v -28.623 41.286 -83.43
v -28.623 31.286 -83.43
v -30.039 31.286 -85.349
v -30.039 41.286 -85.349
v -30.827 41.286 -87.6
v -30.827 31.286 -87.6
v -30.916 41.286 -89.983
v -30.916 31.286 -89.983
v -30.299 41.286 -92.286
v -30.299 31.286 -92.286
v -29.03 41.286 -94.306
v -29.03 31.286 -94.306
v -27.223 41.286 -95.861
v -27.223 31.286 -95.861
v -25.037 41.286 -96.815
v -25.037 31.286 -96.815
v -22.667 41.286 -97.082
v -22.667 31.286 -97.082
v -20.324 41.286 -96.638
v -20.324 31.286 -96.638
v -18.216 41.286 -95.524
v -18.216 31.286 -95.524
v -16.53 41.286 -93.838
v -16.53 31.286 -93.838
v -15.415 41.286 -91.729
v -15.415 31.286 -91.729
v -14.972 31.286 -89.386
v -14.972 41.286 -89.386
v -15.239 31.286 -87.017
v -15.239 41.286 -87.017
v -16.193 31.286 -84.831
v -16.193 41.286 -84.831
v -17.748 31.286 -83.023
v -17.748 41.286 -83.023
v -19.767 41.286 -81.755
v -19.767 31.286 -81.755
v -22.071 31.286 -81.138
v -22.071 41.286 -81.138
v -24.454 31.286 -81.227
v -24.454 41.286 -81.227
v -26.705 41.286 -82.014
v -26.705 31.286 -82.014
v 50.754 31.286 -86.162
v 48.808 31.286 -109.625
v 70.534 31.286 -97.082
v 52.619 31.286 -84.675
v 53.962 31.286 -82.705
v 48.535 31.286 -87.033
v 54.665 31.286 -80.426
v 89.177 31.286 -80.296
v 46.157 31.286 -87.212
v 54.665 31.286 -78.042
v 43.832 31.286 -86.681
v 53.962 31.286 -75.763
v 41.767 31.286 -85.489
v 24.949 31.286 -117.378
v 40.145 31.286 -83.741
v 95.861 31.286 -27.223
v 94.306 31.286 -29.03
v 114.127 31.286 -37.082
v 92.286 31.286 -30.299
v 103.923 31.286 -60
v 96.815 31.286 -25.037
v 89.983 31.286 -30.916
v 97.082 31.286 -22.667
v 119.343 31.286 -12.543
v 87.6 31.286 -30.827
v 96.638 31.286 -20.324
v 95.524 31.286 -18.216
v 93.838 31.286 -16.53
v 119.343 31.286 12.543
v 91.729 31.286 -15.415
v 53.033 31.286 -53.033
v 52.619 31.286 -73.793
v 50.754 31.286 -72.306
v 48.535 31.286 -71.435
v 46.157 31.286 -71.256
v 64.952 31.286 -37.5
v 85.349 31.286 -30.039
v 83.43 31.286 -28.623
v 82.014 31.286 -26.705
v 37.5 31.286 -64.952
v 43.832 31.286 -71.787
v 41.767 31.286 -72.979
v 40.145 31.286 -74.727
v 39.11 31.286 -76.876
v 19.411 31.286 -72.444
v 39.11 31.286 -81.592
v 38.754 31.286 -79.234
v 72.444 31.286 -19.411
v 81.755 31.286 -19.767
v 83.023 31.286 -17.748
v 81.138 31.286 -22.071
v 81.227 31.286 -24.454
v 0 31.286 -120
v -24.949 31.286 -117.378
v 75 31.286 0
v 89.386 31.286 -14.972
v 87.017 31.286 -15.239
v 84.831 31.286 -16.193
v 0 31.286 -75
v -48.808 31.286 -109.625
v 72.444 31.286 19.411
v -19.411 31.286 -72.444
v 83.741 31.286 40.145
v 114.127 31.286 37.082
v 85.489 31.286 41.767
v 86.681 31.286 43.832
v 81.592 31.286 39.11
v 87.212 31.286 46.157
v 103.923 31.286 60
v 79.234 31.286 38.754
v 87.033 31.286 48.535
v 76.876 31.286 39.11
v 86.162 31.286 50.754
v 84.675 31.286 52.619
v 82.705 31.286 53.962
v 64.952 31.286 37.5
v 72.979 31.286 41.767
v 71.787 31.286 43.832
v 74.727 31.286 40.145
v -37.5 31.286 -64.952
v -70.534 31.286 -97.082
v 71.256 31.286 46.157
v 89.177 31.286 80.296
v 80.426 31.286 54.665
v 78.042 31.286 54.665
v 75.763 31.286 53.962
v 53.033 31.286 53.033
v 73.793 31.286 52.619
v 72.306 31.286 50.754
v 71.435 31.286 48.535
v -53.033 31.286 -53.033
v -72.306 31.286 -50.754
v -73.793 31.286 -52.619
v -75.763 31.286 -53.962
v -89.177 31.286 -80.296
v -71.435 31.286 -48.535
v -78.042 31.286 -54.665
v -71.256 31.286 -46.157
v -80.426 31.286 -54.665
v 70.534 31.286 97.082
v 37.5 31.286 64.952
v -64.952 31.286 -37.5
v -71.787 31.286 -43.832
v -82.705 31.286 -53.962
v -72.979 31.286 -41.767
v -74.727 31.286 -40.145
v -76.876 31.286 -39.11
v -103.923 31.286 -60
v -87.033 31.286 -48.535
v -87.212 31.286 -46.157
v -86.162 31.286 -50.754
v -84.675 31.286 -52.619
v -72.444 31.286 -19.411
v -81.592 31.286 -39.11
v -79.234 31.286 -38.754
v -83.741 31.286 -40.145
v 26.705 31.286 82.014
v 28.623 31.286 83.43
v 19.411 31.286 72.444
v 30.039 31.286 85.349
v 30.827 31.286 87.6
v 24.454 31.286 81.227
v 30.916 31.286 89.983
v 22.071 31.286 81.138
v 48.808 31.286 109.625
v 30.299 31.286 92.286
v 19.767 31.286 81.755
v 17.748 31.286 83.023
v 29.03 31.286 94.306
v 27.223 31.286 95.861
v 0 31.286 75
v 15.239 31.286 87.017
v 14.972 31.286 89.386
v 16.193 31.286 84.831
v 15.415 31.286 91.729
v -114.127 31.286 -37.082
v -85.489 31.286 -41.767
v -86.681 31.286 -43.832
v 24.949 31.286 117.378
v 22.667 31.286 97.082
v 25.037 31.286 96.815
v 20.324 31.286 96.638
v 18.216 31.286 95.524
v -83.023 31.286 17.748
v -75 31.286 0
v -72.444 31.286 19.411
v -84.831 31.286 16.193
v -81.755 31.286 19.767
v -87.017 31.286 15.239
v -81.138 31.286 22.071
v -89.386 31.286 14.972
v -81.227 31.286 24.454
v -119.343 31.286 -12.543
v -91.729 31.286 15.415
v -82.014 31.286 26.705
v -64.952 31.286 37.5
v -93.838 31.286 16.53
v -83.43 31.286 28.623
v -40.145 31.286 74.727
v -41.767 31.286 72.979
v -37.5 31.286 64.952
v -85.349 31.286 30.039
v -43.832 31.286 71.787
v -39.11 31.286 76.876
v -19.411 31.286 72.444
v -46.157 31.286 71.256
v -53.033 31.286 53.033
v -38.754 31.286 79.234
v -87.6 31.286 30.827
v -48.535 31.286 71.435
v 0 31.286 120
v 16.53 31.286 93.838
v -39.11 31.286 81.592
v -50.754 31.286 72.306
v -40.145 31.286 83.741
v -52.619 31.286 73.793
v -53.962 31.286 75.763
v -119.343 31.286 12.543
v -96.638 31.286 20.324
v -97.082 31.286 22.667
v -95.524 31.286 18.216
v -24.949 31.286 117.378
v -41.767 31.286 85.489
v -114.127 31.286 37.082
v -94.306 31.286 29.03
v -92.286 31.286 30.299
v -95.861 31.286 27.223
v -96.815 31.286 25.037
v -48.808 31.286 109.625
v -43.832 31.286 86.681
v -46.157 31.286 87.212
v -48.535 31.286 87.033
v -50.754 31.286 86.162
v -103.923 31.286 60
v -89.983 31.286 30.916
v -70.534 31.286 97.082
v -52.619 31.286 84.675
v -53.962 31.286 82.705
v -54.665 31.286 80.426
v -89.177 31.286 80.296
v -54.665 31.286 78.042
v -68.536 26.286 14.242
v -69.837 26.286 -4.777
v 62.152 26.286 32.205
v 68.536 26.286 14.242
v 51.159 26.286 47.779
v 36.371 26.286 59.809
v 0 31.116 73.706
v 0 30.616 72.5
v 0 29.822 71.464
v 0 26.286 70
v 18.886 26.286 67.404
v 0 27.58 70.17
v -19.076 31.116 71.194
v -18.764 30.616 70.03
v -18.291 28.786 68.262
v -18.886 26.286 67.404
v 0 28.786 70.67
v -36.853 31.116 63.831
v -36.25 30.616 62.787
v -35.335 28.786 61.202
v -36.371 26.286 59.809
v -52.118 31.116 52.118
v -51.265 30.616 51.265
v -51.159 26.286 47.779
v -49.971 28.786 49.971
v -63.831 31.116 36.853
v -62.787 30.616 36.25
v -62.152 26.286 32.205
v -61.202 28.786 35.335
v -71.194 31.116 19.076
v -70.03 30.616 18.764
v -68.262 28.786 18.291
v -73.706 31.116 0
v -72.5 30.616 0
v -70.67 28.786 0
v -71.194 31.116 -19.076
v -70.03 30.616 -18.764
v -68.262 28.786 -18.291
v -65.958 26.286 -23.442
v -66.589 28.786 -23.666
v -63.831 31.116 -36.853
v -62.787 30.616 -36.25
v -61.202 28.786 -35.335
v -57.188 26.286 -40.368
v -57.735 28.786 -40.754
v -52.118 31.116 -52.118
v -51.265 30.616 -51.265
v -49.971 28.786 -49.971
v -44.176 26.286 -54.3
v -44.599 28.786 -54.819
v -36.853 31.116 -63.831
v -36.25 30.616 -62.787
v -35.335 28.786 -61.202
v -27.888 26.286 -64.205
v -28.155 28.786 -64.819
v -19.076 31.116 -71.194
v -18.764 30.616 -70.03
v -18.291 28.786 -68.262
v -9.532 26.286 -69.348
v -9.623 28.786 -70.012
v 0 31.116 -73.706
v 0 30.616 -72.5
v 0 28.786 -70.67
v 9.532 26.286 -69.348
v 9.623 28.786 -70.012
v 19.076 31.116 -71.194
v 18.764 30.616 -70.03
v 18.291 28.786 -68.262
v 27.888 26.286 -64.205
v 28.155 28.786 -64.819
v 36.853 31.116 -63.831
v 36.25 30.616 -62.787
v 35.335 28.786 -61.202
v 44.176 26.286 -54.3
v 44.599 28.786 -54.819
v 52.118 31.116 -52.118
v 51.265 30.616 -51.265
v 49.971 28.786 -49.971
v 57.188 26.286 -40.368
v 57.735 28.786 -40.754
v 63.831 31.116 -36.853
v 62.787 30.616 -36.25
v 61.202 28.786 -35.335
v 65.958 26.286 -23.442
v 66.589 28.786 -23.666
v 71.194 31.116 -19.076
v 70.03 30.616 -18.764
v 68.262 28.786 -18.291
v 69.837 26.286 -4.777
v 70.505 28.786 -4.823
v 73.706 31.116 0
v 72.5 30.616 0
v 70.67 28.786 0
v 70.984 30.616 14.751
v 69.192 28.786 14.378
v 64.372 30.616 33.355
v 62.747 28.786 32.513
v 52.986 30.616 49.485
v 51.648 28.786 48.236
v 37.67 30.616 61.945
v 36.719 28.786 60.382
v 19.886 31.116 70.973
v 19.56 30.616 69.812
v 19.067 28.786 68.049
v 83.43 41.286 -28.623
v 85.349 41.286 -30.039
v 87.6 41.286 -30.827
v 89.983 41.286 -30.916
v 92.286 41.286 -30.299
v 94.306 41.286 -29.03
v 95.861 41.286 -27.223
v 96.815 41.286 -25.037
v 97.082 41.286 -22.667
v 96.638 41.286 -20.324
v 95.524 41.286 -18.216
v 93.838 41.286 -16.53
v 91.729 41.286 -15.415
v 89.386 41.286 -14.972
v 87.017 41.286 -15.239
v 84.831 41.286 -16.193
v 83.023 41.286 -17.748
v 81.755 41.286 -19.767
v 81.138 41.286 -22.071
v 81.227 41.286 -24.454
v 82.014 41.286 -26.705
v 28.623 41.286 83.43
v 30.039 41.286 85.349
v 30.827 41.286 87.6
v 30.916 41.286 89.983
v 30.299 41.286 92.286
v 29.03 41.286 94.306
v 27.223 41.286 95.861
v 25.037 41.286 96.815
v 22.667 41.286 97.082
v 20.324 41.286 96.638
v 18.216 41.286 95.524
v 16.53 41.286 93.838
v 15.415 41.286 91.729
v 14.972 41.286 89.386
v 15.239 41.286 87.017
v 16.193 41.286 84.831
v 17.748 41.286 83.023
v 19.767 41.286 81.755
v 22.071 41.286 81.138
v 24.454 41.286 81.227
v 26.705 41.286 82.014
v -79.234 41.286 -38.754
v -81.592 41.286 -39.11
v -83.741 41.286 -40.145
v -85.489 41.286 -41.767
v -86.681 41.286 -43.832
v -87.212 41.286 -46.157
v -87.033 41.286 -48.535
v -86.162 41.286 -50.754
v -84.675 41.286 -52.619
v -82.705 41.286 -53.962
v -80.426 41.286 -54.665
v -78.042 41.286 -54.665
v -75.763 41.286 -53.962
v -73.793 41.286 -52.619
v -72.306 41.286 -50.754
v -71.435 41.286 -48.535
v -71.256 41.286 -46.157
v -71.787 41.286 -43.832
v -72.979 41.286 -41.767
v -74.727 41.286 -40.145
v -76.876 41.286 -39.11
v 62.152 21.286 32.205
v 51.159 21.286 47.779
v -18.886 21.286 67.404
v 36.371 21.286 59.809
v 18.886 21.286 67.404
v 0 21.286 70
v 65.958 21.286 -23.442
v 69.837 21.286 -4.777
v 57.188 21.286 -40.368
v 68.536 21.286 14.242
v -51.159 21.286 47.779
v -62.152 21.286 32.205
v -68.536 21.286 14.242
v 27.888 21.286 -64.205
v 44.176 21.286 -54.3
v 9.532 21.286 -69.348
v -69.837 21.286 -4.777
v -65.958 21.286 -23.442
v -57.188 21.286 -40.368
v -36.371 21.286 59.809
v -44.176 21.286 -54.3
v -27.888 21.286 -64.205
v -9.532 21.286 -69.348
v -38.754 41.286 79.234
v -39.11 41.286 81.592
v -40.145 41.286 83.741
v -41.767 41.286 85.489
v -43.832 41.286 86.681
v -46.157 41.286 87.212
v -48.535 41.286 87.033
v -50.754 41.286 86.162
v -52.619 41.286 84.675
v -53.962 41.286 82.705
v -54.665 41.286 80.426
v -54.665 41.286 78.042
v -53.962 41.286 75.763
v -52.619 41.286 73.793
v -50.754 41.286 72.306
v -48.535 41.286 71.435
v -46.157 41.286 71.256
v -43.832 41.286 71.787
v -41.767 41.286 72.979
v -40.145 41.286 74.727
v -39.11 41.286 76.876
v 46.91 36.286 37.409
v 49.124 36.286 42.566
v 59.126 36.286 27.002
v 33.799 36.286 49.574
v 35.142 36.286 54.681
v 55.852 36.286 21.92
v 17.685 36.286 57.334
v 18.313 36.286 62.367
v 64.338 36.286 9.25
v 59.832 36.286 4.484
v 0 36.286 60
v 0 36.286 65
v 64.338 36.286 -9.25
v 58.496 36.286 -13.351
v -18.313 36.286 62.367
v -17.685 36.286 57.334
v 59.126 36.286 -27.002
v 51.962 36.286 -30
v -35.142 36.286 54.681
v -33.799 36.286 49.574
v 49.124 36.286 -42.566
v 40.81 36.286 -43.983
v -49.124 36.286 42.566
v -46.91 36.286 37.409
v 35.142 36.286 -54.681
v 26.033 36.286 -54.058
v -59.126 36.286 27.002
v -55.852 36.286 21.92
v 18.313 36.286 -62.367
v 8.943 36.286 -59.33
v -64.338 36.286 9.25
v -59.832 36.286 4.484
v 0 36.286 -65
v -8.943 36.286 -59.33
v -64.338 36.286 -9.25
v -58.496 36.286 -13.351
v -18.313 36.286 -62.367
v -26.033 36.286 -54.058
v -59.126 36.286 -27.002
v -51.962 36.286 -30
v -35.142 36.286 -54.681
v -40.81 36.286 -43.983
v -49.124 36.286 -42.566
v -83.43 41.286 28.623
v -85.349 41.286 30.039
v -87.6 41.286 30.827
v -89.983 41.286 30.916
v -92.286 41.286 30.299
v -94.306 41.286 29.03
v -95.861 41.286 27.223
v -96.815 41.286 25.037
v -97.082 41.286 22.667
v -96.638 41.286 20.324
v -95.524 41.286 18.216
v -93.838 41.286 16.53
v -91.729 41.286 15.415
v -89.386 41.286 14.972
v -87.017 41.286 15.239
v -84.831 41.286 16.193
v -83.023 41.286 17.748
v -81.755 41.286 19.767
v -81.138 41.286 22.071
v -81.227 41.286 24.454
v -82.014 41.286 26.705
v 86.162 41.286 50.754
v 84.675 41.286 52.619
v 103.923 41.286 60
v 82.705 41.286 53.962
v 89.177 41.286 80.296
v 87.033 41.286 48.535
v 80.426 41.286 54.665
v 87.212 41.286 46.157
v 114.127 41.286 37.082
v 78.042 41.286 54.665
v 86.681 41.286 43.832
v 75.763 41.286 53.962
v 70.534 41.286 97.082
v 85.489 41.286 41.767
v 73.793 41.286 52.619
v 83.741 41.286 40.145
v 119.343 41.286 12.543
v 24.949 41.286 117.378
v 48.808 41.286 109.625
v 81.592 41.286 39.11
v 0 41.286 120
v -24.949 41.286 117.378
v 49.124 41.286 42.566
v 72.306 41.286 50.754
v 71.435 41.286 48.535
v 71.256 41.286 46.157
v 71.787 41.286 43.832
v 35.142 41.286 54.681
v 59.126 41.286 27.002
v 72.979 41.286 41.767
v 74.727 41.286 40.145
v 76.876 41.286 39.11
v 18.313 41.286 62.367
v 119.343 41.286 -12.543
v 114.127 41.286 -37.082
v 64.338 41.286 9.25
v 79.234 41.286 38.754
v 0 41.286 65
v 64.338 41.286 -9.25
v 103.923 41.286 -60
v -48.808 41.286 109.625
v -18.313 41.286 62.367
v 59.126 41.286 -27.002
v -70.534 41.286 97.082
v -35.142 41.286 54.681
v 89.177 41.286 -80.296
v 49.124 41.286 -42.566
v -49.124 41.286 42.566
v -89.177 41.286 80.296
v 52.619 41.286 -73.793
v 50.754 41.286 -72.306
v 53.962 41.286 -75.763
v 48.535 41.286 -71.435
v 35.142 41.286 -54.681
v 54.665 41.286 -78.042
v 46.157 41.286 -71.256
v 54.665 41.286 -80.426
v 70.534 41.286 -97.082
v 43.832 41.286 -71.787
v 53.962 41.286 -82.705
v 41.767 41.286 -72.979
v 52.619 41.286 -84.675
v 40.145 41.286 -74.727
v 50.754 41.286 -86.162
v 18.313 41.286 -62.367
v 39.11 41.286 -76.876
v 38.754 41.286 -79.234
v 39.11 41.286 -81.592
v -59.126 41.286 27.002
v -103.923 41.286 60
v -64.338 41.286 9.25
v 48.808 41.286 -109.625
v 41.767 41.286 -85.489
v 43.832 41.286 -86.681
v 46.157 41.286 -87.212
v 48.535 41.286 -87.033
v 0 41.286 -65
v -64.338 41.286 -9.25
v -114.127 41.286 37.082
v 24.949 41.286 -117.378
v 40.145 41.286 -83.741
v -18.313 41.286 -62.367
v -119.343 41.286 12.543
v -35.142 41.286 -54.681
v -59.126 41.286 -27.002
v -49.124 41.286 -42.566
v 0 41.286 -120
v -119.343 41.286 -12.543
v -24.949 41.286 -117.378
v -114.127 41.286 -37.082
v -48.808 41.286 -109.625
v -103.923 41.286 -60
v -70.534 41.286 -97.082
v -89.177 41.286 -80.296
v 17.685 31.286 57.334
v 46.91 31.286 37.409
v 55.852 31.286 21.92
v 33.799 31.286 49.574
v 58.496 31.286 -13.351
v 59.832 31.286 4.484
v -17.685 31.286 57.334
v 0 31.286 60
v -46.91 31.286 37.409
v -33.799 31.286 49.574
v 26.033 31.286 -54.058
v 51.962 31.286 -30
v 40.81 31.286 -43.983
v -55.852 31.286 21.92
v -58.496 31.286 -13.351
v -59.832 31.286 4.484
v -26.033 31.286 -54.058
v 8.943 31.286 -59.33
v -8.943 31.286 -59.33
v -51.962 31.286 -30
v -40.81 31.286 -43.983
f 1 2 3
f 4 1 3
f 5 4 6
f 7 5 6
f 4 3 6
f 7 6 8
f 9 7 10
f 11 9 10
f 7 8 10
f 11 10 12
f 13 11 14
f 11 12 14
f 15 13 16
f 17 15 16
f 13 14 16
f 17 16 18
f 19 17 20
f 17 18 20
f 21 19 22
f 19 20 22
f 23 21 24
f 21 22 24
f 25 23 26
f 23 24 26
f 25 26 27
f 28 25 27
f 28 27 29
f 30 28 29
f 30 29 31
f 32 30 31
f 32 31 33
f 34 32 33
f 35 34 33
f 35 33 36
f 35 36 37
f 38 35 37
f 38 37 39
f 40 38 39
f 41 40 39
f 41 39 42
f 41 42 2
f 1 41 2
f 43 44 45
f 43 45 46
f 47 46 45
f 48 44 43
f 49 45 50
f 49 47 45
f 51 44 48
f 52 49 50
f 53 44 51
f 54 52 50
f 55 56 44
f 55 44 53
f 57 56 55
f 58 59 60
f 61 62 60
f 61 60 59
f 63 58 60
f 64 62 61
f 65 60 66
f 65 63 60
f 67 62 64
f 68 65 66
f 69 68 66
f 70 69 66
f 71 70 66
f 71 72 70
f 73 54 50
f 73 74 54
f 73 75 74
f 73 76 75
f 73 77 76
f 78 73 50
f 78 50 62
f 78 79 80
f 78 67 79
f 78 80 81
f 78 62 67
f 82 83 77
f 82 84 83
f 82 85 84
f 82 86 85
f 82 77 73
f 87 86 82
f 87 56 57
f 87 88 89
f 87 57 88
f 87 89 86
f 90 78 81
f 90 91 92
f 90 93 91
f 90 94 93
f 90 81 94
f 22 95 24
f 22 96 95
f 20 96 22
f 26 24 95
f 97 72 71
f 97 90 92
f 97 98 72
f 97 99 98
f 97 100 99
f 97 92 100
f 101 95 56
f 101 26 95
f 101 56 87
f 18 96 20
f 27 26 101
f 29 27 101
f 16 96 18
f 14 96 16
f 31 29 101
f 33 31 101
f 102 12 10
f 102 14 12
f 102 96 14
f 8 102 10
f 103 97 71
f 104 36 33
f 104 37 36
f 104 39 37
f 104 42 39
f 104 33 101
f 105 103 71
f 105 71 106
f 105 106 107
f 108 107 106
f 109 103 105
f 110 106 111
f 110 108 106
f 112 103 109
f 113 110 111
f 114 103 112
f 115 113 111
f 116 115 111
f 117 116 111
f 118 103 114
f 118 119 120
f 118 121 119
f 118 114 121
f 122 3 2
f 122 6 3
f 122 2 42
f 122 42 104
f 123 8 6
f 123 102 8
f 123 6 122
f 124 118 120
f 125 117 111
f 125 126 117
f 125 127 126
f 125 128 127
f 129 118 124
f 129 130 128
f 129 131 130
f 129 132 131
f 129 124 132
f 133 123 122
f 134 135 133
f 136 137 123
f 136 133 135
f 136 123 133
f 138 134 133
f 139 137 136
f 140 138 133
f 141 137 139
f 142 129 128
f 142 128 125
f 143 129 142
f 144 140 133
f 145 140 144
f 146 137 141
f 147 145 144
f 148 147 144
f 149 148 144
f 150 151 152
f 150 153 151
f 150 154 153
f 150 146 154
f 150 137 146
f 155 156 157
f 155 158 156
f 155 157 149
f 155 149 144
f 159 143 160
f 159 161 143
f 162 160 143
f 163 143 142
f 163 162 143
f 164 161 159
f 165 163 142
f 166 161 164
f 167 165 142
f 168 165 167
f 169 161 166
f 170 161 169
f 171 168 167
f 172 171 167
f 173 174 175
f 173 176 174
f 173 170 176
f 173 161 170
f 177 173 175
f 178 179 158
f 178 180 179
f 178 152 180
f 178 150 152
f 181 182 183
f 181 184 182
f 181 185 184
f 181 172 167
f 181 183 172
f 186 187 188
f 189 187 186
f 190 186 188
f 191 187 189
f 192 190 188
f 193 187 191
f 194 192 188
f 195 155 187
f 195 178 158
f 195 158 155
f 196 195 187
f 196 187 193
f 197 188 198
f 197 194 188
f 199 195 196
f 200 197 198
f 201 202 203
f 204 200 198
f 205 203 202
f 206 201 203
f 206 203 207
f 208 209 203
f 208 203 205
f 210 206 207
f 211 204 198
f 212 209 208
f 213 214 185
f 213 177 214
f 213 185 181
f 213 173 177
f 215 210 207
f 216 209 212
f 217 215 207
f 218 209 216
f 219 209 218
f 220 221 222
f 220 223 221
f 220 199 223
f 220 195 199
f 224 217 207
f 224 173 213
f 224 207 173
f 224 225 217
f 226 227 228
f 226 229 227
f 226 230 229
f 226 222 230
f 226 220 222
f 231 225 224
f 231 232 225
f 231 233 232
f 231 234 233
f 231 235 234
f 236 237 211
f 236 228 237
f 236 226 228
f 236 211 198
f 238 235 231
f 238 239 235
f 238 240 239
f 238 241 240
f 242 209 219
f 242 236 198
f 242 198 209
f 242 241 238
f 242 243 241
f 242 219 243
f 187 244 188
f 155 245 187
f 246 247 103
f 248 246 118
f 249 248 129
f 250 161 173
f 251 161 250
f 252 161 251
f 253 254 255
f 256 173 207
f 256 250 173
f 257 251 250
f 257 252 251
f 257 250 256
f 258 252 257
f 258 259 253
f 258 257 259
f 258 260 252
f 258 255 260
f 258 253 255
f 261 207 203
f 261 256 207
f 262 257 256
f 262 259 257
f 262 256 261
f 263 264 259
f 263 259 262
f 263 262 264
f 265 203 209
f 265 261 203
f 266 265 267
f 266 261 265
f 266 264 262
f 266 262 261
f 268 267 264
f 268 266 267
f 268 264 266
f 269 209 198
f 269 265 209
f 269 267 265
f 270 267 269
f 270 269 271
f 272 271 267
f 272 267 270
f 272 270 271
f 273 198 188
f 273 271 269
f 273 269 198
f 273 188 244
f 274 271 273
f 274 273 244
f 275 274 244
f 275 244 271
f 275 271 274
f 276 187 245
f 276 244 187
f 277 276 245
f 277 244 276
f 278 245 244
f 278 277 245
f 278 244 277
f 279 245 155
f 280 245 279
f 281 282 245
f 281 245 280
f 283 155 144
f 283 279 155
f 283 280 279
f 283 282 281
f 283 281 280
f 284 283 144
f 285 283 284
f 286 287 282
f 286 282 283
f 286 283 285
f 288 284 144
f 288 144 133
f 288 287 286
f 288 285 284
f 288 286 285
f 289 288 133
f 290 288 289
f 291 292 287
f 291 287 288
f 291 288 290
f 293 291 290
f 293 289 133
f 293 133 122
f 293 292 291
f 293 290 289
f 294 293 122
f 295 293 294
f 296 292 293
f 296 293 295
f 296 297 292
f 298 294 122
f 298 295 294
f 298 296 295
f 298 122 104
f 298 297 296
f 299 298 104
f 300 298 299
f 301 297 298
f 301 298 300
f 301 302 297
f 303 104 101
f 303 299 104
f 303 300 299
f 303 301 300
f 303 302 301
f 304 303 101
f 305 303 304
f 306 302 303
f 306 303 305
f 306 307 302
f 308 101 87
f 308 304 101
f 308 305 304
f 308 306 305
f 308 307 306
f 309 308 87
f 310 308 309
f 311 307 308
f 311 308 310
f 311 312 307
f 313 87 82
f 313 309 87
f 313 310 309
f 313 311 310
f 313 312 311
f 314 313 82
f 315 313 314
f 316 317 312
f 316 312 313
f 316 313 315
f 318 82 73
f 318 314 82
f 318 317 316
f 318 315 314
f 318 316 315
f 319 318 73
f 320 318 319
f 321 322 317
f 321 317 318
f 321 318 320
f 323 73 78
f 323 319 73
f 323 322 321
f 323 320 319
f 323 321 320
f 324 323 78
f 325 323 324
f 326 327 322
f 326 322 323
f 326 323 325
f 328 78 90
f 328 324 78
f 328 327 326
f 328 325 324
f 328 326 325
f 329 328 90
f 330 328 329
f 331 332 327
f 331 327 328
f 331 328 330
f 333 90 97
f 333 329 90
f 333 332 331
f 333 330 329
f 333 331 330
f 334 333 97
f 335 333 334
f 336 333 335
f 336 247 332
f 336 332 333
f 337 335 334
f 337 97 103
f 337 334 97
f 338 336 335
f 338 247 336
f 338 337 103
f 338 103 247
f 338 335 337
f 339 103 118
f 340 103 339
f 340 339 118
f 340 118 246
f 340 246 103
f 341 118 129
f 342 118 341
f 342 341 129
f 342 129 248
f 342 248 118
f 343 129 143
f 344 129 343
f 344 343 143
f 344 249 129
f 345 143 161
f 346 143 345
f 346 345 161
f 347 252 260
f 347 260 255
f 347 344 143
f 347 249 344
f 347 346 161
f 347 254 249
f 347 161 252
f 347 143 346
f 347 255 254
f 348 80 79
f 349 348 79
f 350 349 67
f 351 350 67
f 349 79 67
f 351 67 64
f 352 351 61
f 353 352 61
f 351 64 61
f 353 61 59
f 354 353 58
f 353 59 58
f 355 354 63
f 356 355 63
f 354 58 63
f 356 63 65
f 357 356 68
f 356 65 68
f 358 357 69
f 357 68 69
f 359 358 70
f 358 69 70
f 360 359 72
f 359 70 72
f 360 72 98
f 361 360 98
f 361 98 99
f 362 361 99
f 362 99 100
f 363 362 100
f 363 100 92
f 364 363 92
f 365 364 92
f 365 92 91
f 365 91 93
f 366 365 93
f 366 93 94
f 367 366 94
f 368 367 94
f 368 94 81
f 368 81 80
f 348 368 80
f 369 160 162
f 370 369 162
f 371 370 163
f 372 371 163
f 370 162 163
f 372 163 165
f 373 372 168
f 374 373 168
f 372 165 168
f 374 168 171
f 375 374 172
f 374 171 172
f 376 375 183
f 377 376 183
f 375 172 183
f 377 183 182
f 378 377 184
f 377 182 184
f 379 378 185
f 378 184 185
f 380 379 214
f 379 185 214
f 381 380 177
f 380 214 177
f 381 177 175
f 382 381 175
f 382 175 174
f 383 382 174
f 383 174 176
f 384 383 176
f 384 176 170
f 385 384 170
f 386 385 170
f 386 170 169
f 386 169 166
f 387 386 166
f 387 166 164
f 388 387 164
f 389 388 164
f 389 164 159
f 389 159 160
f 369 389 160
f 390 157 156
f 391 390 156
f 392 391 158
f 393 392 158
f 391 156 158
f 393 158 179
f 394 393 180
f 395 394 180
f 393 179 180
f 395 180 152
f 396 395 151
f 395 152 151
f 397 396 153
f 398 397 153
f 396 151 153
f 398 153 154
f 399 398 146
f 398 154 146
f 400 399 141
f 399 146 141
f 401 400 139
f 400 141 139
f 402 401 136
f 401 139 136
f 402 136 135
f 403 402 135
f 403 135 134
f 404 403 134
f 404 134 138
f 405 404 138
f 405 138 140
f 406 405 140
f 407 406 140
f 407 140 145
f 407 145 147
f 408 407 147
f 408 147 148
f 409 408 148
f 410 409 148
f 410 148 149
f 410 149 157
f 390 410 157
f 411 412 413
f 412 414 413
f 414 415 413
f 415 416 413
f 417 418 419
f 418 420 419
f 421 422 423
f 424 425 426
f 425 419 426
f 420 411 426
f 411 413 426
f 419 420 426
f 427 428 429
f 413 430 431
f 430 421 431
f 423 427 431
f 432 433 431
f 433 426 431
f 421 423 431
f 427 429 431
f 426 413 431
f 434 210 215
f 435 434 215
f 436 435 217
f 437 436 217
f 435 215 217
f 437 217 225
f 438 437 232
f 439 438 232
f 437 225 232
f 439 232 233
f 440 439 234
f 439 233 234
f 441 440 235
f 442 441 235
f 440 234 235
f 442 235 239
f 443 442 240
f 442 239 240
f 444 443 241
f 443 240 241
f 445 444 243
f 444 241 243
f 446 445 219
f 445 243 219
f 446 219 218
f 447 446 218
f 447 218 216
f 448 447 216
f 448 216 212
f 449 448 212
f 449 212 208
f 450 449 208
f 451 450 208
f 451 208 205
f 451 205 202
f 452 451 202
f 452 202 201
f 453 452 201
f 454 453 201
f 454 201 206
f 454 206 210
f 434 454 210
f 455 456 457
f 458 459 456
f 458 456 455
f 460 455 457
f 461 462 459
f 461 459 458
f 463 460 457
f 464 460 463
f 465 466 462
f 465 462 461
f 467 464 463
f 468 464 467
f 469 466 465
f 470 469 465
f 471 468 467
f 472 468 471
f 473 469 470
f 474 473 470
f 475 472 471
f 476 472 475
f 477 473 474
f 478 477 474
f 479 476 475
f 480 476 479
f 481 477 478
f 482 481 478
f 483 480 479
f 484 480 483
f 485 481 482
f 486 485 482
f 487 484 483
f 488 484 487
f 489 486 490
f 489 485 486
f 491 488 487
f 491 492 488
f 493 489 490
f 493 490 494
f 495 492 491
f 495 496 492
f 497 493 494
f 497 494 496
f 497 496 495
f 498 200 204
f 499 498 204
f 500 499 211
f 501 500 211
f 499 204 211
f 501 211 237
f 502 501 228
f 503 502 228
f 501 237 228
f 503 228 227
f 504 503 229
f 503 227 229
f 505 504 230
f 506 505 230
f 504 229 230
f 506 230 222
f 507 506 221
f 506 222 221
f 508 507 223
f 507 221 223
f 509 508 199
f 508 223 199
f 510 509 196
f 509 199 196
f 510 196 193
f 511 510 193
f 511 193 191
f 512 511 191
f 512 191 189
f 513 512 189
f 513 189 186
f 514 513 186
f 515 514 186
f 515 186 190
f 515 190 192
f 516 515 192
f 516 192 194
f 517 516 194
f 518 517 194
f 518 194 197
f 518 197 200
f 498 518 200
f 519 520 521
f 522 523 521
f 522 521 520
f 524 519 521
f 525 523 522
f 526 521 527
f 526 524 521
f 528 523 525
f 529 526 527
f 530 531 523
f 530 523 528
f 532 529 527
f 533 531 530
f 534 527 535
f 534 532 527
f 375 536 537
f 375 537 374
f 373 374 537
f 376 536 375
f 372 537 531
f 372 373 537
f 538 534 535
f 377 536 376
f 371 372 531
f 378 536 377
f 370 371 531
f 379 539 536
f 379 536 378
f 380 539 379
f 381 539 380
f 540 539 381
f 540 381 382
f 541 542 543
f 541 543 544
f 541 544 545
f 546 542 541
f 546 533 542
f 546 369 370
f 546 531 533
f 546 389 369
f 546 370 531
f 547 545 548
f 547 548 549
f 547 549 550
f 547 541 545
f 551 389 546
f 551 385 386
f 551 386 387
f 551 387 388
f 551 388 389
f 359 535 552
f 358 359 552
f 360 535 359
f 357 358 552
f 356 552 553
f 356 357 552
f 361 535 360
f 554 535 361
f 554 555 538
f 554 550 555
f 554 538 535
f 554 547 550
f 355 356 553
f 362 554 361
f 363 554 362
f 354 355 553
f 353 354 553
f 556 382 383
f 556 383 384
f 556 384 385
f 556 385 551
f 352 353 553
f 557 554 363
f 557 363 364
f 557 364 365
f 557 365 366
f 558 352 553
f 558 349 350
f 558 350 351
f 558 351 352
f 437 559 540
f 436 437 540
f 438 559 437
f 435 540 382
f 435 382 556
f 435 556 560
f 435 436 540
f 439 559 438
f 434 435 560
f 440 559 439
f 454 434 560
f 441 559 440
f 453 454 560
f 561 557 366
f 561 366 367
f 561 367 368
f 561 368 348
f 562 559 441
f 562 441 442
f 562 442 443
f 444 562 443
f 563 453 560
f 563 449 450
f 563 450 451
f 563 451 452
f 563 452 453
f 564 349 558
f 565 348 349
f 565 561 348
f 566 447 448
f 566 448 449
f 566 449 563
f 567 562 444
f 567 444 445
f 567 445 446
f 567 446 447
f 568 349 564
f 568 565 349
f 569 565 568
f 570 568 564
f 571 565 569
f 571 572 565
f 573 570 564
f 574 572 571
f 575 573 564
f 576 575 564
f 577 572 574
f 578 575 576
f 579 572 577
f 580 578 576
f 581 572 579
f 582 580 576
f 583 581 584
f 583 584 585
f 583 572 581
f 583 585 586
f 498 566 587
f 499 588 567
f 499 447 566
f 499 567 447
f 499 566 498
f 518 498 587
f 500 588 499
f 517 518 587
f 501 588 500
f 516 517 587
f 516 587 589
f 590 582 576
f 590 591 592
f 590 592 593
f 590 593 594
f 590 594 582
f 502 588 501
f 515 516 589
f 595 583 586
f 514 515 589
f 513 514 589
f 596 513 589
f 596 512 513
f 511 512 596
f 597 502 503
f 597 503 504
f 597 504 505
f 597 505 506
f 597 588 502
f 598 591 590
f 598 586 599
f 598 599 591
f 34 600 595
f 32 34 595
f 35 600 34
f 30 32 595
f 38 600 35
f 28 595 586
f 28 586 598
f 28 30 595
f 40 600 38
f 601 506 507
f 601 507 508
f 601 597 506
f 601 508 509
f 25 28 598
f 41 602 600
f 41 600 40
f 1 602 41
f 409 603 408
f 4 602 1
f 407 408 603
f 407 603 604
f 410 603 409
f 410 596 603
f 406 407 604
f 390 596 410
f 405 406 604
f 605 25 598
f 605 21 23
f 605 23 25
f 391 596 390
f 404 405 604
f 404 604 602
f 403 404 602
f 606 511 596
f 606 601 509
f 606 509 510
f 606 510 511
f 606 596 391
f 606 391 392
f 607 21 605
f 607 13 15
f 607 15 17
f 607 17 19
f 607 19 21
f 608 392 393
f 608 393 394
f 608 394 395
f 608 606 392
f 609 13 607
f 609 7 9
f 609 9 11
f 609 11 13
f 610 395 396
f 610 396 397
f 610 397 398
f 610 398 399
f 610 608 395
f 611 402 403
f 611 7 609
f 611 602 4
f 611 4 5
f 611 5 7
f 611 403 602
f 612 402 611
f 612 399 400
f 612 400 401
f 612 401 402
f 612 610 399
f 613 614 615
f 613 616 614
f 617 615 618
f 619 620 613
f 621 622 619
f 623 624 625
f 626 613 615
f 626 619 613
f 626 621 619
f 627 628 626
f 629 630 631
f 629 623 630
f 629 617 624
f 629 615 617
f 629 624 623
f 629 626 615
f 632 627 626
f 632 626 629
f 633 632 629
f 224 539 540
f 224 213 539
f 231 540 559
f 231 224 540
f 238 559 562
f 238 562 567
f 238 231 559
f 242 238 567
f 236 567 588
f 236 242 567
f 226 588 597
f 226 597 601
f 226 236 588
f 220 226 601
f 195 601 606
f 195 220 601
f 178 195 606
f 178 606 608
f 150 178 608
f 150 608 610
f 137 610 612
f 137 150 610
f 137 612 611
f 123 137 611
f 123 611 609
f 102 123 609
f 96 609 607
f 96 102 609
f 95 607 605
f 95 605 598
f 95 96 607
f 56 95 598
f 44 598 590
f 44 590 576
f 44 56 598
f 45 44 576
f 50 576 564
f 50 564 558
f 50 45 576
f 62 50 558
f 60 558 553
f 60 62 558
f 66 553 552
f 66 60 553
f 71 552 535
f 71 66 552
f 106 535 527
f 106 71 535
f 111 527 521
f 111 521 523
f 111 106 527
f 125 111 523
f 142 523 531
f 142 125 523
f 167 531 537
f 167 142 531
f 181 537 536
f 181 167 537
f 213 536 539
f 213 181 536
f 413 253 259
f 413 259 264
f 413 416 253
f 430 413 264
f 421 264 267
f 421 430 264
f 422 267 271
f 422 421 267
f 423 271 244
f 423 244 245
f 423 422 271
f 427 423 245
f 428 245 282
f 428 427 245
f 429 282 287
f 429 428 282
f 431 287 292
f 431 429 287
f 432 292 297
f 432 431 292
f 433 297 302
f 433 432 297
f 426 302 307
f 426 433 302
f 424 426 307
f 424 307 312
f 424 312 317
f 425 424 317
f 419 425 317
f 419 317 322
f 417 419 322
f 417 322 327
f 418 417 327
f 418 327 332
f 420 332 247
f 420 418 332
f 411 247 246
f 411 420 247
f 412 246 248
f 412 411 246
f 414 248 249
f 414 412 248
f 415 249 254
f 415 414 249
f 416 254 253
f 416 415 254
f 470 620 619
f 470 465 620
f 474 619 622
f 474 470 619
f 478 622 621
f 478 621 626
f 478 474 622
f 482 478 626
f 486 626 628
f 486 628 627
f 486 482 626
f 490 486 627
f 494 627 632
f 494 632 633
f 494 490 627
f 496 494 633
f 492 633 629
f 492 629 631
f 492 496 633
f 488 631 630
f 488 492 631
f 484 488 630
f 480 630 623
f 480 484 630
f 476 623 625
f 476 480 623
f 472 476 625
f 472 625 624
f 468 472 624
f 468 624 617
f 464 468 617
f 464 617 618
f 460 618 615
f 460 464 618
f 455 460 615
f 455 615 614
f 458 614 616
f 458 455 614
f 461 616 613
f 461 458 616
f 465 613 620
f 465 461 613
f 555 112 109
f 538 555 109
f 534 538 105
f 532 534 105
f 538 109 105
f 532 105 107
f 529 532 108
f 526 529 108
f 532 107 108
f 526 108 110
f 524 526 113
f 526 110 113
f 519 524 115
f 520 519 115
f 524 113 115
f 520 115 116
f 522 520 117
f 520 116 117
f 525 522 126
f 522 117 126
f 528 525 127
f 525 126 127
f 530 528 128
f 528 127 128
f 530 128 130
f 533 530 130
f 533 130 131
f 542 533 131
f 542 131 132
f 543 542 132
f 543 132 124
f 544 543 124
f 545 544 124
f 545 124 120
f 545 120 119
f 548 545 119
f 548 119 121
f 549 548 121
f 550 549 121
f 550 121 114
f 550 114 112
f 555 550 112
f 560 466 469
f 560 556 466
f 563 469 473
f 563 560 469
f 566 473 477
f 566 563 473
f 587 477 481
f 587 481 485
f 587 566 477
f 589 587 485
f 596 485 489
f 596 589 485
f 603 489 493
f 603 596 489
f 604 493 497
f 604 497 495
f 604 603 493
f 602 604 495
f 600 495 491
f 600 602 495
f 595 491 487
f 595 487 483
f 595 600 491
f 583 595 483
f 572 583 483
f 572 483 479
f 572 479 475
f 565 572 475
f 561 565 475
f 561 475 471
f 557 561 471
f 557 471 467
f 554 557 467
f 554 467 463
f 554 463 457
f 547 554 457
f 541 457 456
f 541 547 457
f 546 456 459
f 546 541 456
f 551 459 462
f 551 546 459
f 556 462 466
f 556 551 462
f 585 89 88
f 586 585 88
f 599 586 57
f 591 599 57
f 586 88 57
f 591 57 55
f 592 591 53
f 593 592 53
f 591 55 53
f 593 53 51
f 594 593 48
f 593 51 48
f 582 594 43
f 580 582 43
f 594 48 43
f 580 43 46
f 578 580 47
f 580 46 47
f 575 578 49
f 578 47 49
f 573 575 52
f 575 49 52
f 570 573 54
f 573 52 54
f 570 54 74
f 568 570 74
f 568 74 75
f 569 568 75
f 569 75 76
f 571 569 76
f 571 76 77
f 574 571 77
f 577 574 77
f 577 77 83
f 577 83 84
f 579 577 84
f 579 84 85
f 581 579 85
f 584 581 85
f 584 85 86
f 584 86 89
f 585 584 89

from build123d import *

# Parameters (mm, degrees)
SKETCH1_W          = 60
SKETCH1_H          = 10
SKETCH2_R          = 8
CUT_EXTRUDE1_DEPTH = 171
CIRPATTERN1_COUNT  = 8


with BuildPart() as part:
    # Sketch1 → Revolve1 (revolve)
    with BuildSketch(Plane.XY, mode=Mode.PRIVATE) as revolve1_sk:
        with BuildLine():
            ThreePointArc((75, 31.286171589), (71.464466094, 29.821705495), (70, 26.286171589))
            Line((70, 26.286171589), (70, 21.286171589))
            Line((70, 21.286171589), (60, 21.286171589))
            Line((60, 21.286171589), (60, 36.286171589))
            Line((60, 36.286171589), (65, 36.286171589))
            Line((65, 36.286171589), (65, 41.286171589))
            Line((65, 41.286171589), (120, 41.286171589))
            Line((120, 41.286171589), (120, 31.286171589))
            Line((120, 31.286171589), (75, 31.286171589))
        make_face()
        with Locations((30, 26.286171589)):
            Rectangle(SKETCH1_W, SKETCH1_H)
    revolve(revolve1_sk.sketch.rotate(Axis((0, 97.731625762, 0), (0, -1, 0)), 90), axis=Axis((0, 97.731625762, 0), (0, -1, 0)))

    # Sketch2 → Cut-Extrude1 (cut, through all)
    with BuildSketch(Plane.XZ.offset(-31.286171589)):
        with Locations(Location((79.233979131, 46.754428144, 0), (0, 0, 270))):
            Circle(SKETCH2_R)
    cut_extrude1 = extrude(amount=-CUT_EXTRUDE1_DEPTH, mode=Mode.SUBTRACT)

    # CirPattern1: Cut-Extrude1 ×8 about axis
    cirpattern1_axis = Axis((0, 0, 0), (0, 1, 0))
    for i in range(1, CIRPATTERN1_COUNT):
        add(cut_extrude1.rotate(cirpattern1_axis, i * 360 / CIRPATTERN1_COUNT), mode=Mode.SUBTRACT)


solid = part.part
